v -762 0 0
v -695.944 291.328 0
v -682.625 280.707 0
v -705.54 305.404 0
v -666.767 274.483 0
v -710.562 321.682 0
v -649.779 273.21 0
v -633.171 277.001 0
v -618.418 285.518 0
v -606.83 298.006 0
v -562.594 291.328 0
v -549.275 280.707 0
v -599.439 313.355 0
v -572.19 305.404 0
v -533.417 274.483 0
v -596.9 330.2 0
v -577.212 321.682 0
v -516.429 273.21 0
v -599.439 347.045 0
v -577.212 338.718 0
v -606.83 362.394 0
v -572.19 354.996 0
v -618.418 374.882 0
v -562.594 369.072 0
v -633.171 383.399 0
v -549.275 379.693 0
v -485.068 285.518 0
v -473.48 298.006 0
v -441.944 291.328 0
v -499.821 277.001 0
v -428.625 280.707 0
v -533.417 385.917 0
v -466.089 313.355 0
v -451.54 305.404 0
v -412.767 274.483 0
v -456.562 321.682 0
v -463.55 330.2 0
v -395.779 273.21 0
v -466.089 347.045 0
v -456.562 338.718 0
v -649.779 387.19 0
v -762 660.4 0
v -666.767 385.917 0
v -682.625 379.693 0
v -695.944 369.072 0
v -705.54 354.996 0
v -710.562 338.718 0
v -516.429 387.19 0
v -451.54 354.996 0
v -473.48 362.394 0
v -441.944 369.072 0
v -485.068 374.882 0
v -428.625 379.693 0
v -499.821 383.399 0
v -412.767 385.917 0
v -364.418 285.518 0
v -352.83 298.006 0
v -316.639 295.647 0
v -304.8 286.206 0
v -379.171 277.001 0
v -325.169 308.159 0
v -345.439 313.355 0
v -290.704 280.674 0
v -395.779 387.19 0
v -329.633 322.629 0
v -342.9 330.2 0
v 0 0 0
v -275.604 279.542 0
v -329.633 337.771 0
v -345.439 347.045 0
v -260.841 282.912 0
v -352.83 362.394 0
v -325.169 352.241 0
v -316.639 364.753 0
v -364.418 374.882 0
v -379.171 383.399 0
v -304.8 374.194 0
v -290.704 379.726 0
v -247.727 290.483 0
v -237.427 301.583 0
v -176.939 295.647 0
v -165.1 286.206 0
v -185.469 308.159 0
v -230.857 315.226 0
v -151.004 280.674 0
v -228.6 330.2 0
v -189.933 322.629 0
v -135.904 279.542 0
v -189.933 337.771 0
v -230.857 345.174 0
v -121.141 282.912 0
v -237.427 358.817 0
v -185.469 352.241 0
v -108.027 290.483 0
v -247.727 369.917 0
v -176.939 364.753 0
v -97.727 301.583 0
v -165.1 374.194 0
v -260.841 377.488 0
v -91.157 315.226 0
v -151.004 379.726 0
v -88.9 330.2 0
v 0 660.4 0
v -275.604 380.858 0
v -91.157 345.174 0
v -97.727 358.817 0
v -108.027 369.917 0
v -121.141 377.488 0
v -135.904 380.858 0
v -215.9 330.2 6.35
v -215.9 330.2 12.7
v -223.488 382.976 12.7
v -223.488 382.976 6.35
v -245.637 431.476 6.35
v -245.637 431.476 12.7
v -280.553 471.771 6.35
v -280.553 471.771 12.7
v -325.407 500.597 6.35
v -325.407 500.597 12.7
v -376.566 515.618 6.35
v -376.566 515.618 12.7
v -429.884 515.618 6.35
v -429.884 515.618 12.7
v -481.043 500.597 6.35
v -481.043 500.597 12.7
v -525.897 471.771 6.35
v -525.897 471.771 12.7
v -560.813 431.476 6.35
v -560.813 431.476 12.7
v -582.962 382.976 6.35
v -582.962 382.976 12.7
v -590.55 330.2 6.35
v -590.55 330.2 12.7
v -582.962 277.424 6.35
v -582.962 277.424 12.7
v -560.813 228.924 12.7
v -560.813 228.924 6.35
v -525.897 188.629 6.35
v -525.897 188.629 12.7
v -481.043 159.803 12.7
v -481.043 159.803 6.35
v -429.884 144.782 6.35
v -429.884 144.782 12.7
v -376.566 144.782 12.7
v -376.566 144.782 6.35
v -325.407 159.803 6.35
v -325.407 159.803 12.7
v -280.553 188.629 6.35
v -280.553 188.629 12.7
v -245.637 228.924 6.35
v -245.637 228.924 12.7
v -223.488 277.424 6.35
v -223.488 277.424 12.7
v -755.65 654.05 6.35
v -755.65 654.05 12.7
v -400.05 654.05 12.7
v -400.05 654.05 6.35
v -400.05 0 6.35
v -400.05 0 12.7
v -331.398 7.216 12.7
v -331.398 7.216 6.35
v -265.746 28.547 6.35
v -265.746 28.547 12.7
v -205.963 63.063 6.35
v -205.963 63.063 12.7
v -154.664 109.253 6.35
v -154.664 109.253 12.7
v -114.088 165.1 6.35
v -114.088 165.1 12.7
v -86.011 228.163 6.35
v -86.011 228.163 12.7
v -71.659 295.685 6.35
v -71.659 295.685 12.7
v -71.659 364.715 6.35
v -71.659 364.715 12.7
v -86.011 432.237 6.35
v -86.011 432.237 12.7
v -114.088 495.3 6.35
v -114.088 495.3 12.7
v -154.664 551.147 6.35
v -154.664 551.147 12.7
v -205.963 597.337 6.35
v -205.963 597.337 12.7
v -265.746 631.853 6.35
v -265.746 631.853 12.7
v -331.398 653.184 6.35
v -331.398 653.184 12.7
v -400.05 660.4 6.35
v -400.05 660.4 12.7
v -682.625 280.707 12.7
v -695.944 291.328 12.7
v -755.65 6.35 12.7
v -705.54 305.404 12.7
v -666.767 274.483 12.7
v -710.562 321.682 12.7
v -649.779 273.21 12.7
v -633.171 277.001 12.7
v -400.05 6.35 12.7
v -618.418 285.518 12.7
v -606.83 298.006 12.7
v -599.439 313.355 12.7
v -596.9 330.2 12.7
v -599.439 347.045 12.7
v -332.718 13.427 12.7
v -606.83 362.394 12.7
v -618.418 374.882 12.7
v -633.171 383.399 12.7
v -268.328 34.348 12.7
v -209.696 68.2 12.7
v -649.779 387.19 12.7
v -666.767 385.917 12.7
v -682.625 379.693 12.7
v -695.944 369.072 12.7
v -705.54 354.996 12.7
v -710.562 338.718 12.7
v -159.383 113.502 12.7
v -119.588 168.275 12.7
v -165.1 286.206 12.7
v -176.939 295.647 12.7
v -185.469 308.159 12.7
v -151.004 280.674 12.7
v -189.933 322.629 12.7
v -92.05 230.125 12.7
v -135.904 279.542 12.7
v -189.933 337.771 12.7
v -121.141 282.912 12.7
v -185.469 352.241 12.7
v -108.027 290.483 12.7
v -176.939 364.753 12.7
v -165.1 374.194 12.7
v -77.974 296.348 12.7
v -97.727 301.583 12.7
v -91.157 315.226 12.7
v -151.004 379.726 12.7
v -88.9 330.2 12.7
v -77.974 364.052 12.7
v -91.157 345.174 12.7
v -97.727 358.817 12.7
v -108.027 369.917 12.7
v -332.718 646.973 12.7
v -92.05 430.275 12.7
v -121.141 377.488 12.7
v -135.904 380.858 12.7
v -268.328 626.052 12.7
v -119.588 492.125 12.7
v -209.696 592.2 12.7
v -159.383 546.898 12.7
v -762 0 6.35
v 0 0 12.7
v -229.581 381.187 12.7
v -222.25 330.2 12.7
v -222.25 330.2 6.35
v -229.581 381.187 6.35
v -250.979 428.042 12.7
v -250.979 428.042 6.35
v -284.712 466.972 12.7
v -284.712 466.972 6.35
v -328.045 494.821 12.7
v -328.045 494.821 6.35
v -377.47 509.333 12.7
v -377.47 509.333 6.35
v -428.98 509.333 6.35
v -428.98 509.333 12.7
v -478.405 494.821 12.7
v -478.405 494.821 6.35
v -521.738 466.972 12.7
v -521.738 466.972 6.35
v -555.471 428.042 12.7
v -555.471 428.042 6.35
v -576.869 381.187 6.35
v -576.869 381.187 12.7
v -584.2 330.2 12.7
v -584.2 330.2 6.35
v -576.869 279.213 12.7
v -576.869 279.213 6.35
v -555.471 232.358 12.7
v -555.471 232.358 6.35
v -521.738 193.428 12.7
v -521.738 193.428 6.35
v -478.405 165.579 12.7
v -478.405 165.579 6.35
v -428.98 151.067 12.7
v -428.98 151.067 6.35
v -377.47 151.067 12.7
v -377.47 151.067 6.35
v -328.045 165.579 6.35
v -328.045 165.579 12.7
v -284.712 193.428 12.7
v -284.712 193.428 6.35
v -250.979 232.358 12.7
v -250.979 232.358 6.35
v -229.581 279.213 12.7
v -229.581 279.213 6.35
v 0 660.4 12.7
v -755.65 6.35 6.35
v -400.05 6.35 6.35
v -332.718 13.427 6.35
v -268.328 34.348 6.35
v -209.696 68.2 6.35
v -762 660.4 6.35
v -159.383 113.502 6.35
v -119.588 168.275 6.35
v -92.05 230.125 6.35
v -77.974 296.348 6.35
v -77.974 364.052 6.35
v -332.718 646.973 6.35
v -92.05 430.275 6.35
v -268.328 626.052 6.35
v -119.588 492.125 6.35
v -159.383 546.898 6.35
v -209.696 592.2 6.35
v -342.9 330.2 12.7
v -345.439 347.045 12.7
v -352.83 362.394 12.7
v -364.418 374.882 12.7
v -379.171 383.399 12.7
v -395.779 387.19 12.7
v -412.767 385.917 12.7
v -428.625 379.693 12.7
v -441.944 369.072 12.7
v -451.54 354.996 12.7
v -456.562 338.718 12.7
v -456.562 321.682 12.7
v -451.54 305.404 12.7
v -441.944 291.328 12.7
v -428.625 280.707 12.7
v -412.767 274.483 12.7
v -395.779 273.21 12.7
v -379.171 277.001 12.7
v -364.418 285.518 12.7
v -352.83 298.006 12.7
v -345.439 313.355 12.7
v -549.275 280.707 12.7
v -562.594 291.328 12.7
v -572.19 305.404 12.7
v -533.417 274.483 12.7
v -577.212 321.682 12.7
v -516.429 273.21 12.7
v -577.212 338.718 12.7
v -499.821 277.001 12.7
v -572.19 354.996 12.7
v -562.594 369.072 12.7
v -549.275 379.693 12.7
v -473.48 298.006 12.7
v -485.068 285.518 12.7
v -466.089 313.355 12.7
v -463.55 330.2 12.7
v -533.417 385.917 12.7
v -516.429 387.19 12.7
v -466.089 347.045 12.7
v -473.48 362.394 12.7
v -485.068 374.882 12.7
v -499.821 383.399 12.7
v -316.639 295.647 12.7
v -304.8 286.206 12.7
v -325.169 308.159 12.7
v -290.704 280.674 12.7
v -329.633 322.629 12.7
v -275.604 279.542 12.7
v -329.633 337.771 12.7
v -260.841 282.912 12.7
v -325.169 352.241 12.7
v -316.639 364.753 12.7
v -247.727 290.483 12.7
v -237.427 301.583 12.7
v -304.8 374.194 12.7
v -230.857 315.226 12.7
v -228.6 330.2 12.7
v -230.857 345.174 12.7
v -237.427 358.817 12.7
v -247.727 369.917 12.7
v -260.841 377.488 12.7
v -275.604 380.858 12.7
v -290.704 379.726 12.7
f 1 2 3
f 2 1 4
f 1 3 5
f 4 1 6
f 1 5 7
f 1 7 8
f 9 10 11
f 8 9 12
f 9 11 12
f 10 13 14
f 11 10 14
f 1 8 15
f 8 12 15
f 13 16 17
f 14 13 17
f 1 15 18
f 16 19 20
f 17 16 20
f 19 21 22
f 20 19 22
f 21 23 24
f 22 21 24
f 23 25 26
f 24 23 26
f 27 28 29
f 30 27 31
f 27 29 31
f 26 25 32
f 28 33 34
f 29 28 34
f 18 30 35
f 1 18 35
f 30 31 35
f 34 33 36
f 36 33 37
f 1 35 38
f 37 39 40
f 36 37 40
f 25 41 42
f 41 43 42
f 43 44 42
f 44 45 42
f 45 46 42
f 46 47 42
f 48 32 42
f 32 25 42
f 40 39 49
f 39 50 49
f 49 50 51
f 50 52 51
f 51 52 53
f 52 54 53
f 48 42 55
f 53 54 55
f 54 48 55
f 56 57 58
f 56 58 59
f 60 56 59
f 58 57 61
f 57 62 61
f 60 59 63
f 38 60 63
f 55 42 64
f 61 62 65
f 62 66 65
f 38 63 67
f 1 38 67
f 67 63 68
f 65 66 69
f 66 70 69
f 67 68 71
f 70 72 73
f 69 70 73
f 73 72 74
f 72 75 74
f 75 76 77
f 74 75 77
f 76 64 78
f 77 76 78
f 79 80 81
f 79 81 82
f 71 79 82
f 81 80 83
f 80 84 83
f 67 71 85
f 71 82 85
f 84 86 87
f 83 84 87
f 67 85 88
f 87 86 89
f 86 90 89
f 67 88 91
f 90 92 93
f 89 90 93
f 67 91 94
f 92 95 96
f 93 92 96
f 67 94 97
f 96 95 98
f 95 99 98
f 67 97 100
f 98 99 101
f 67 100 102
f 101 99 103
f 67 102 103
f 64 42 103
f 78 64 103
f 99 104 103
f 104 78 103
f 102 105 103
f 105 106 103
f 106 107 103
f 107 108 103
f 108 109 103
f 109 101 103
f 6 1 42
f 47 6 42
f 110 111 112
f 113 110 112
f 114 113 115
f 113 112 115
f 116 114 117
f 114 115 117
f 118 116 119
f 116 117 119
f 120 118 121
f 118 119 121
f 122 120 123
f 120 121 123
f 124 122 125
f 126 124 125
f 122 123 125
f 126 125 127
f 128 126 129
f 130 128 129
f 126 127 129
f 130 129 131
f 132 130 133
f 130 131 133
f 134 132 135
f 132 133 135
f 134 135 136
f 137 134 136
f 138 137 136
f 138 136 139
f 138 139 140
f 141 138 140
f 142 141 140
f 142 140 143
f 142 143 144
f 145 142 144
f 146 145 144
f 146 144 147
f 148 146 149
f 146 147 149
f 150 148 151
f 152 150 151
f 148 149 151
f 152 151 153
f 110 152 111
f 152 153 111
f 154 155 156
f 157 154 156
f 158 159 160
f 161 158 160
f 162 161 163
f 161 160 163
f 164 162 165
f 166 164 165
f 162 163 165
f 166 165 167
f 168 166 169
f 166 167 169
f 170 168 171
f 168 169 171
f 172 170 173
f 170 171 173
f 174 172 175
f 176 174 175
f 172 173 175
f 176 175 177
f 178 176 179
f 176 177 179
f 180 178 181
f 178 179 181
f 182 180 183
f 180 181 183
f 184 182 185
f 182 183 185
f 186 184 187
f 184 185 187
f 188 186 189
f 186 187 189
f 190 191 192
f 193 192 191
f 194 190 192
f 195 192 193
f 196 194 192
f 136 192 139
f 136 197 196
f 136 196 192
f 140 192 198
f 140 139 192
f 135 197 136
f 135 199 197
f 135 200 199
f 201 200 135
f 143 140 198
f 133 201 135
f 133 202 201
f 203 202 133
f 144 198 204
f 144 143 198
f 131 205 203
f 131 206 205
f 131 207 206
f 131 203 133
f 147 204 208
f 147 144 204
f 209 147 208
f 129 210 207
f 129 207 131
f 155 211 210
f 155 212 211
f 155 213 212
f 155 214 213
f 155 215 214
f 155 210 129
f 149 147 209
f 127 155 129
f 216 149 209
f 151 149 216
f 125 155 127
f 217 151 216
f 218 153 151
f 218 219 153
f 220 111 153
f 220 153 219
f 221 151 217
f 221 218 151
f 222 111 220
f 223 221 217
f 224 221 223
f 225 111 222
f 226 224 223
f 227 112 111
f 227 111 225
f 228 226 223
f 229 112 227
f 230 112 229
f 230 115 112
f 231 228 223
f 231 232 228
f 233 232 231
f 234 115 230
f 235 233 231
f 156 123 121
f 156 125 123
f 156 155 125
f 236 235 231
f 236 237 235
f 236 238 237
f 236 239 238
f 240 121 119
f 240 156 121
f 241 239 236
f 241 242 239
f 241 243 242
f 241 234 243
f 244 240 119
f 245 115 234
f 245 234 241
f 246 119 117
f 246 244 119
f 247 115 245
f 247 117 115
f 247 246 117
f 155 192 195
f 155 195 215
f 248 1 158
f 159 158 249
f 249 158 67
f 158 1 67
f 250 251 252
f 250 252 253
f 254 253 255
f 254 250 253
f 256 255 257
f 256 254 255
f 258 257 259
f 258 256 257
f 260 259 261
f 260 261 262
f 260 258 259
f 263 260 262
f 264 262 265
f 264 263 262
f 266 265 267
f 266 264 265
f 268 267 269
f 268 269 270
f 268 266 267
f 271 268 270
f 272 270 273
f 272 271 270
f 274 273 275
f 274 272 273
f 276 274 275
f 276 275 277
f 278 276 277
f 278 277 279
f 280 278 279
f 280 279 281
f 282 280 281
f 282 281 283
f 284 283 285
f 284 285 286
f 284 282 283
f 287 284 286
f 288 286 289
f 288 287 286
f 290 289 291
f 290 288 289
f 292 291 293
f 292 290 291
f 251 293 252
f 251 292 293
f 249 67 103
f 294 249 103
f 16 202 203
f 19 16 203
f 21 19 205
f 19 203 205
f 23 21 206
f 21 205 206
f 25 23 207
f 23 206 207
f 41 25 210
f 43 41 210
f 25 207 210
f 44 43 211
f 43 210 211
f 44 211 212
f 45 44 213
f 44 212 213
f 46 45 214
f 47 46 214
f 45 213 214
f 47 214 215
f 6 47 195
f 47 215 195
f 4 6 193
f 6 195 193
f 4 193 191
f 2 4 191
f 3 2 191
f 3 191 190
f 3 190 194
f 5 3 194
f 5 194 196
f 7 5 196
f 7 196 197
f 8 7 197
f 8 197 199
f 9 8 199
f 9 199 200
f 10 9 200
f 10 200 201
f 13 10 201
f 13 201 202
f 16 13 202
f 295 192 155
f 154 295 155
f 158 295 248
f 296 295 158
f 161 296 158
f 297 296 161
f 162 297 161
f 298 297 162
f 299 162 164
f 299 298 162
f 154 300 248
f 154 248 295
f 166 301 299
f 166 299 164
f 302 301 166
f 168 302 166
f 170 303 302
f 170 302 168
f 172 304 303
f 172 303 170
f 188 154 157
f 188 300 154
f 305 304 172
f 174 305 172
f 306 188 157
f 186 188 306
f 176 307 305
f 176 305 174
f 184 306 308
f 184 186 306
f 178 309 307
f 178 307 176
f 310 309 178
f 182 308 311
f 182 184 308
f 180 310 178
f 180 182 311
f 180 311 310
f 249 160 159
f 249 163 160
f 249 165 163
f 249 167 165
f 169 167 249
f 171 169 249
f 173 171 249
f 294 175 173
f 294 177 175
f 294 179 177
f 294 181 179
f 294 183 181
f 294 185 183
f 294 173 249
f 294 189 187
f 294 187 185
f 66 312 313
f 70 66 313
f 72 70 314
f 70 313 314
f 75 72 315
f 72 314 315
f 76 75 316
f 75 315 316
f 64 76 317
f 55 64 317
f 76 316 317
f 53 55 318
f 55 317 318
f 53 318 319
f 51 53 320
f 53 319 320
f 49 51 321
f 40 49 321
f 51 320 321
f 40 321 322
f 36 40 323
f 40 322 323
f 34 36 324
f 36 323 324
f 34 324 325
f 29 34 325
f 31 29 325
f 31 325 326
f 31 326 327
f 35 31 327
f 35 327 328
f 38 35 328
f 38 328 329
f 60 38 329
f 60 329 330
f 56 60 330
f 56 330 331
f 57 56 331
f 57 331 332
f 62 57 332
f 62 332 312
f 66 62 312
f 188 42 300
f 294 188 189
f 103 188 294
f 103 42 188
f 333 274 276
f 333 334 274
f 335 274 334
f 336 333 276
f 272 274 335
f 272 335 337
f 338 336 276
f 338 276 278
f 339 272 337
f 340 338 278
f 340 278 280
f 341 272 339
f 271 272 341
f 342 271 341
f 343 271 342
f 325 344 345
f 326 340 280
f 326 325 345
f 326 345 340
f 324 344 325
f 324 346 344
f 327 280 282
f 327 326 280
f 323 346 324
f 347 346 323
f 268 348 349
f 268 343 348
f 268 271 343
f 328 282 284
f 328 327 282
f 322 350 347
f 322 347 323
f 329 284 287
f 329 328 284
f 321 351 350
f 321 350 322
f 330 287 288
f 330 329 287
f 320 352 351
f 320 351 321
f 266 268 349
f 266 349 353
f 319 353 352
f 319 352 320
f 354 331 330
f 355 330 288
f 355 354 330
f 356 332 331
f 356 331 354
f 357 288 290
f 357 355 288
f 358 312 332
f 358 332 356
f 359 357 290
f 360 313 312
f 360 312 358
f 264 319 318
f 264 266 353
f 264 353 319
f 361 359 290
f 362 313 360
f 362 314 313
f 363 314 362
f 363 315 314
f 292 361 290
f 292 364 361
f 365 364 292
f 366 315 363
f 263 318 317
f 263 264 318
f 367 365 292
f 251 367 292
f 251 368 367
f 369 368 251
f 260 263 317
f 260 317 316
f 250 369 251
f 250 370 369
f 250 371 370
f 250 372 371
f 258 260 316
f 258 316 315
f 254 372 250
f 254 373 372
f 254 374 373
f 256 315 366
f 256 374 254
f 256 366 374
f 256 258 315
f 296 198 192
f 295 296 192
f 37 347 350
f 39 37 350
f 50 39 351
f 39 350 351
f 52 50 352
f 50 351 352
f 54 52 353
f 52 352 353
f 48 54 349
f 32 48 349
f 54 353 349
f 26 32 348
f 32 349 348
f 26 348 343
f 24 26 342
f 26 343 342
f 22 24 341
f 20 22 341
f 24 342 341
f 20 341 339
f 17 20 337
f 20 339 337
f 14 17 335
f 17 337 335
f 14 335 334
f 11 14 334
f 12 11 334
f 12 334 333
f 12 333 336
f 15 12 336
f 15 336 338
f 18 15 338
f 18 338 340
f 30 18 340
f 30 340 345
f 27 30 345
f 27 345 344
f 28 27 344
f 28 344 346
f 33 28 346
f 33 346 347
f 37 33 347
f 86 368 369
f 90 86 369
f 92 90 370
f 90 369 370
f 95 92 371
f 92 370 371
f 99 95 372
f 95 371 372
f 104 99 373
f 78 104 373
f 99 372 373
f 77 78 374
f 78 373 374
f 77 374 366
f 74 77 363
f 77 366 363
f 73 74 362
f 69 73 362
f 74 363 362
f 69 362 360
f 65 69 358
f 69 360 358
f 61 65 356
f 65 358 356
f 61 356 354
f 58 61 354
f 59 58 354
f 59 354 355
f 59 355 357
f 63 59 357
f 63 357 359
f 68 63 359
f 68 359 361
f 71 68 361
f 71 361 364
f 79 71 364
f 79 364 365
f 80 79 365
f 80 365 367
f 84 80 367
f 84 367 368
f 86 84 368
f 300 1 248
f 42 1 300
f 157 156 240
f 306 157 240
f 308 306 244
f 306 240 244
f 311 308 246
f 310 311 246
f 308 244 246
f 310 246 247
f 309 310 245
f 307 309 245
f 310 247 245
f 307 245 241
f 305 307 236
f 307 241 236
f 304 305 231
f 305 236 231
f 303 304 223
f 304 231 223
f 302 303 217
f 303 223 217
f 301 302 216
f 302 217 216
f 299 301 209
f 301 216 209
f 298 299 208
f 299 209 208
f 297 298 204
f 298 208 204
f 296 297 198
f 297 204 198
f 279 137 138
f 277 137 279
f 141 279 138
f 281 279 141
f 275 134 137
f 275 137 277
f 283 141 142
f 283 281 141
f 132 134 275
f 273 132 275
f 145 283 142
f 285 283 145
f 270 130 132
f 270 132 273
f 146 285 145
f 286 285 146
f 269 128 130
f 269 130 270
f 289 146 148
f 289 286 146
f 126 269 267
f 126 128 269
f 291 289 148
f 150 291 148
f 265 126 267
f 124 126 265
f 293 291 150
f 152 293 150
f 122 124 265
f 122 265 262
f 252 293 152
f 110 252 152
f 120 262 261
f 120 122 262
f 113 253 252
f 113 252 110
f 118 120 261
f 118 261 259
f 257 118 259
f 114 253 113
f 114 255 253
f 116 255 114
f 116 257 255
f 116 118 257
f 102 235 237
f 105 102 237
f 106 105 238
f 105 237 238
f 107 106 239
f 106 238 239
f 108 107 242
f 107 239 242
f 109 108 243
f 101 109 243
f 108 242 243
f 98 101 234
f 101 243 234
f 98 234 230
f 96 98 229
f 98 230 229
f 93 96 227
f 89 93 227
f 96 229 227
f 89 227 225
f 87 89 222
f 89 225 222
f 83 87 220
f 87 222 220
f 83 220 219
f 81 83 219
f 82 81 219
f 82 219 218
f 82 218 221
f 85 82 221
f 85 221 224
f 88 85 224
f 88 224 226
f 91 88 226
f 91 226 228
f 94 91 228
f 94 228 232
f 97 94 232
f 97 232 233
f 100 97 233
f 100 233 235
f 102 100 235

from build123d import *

# Parameters (mm, degrees)
F0_W     = 762
F0_H     = 660.4
F1_DEPTH = 12.7
F2_R     = 50.8
F2_R_2   = 57.15
F3_DEPTH = 12.701
F4_R     = 187.325
F4_R_2   = 180.975
F5_DEPTH = 6.35


with BuildPart() as f1:
    # F0 (on Top) → F1 (new body)
    with BuildSketch(Plane.XY):
        with Locations((-381, 330.2)):
            Rectangle(F0_W, F0_H)
    extrude(amount=F1_DEPTH)

    # F2 (on face) → F3 (cut, through all)
    with BuildSketch(Plane.XY.offset(12.7)):
        with Locations((-139.7, 330.2)):
            Circle(F2_R)
        with Locations((-279.4, 330.2)):
            Circle(F2_R)
        with Locations((-400.05, 330.2)):
            Circle(F2_R_2)
        with Locations((-520.7, 330.2)):
            Circle(F2_R_2)
        with Locations((-654.05, 330.2)):
            Circle(F2_R_2)
    extrude(amount=-F3_DEPTH, mode=Mode.SUBTRACT)

    # F4 (on face) → F5 (cut)
    with BuildSketch(Plane.XY.offset(12.7)):
        with BuildLine():
            Line((-762, 0), (-400.050008, 0))
            ThreePointArc((-400.050008, 0), (-69.850008, 330.2), (-400.050008, 660.4))
            Line((-400.050008, 660.4), (-762, 660.4))
            Line((-762, 660.4), (-762, 0))
        make_face()
        with BuildLine():
            ThreePointArc((-400.050008, 654.050008), (-76.2, 330.2), (-400.050008, 6.349992))
            Line((-400.050008, 6.349992), (-755.65, 6.349992))
            Line((-755.65, 6.349992), (-755.65, 654.050008))
            Line((-755.65, 654.050008), (-400.050008, 654.050008))
        make_face(mode=Mode.SUBTRACT)
        with Locations((-403.225, 330.2)):
            Circle(F4_R)
        with Locations((-403.225, 330.2)):
            Circle(F4_R_2, mode=Mode.SUBTRACT)
    extrude(amount=-F5_DEPTH, mode=Mode.SUBTRACT)


solid = f1.part
